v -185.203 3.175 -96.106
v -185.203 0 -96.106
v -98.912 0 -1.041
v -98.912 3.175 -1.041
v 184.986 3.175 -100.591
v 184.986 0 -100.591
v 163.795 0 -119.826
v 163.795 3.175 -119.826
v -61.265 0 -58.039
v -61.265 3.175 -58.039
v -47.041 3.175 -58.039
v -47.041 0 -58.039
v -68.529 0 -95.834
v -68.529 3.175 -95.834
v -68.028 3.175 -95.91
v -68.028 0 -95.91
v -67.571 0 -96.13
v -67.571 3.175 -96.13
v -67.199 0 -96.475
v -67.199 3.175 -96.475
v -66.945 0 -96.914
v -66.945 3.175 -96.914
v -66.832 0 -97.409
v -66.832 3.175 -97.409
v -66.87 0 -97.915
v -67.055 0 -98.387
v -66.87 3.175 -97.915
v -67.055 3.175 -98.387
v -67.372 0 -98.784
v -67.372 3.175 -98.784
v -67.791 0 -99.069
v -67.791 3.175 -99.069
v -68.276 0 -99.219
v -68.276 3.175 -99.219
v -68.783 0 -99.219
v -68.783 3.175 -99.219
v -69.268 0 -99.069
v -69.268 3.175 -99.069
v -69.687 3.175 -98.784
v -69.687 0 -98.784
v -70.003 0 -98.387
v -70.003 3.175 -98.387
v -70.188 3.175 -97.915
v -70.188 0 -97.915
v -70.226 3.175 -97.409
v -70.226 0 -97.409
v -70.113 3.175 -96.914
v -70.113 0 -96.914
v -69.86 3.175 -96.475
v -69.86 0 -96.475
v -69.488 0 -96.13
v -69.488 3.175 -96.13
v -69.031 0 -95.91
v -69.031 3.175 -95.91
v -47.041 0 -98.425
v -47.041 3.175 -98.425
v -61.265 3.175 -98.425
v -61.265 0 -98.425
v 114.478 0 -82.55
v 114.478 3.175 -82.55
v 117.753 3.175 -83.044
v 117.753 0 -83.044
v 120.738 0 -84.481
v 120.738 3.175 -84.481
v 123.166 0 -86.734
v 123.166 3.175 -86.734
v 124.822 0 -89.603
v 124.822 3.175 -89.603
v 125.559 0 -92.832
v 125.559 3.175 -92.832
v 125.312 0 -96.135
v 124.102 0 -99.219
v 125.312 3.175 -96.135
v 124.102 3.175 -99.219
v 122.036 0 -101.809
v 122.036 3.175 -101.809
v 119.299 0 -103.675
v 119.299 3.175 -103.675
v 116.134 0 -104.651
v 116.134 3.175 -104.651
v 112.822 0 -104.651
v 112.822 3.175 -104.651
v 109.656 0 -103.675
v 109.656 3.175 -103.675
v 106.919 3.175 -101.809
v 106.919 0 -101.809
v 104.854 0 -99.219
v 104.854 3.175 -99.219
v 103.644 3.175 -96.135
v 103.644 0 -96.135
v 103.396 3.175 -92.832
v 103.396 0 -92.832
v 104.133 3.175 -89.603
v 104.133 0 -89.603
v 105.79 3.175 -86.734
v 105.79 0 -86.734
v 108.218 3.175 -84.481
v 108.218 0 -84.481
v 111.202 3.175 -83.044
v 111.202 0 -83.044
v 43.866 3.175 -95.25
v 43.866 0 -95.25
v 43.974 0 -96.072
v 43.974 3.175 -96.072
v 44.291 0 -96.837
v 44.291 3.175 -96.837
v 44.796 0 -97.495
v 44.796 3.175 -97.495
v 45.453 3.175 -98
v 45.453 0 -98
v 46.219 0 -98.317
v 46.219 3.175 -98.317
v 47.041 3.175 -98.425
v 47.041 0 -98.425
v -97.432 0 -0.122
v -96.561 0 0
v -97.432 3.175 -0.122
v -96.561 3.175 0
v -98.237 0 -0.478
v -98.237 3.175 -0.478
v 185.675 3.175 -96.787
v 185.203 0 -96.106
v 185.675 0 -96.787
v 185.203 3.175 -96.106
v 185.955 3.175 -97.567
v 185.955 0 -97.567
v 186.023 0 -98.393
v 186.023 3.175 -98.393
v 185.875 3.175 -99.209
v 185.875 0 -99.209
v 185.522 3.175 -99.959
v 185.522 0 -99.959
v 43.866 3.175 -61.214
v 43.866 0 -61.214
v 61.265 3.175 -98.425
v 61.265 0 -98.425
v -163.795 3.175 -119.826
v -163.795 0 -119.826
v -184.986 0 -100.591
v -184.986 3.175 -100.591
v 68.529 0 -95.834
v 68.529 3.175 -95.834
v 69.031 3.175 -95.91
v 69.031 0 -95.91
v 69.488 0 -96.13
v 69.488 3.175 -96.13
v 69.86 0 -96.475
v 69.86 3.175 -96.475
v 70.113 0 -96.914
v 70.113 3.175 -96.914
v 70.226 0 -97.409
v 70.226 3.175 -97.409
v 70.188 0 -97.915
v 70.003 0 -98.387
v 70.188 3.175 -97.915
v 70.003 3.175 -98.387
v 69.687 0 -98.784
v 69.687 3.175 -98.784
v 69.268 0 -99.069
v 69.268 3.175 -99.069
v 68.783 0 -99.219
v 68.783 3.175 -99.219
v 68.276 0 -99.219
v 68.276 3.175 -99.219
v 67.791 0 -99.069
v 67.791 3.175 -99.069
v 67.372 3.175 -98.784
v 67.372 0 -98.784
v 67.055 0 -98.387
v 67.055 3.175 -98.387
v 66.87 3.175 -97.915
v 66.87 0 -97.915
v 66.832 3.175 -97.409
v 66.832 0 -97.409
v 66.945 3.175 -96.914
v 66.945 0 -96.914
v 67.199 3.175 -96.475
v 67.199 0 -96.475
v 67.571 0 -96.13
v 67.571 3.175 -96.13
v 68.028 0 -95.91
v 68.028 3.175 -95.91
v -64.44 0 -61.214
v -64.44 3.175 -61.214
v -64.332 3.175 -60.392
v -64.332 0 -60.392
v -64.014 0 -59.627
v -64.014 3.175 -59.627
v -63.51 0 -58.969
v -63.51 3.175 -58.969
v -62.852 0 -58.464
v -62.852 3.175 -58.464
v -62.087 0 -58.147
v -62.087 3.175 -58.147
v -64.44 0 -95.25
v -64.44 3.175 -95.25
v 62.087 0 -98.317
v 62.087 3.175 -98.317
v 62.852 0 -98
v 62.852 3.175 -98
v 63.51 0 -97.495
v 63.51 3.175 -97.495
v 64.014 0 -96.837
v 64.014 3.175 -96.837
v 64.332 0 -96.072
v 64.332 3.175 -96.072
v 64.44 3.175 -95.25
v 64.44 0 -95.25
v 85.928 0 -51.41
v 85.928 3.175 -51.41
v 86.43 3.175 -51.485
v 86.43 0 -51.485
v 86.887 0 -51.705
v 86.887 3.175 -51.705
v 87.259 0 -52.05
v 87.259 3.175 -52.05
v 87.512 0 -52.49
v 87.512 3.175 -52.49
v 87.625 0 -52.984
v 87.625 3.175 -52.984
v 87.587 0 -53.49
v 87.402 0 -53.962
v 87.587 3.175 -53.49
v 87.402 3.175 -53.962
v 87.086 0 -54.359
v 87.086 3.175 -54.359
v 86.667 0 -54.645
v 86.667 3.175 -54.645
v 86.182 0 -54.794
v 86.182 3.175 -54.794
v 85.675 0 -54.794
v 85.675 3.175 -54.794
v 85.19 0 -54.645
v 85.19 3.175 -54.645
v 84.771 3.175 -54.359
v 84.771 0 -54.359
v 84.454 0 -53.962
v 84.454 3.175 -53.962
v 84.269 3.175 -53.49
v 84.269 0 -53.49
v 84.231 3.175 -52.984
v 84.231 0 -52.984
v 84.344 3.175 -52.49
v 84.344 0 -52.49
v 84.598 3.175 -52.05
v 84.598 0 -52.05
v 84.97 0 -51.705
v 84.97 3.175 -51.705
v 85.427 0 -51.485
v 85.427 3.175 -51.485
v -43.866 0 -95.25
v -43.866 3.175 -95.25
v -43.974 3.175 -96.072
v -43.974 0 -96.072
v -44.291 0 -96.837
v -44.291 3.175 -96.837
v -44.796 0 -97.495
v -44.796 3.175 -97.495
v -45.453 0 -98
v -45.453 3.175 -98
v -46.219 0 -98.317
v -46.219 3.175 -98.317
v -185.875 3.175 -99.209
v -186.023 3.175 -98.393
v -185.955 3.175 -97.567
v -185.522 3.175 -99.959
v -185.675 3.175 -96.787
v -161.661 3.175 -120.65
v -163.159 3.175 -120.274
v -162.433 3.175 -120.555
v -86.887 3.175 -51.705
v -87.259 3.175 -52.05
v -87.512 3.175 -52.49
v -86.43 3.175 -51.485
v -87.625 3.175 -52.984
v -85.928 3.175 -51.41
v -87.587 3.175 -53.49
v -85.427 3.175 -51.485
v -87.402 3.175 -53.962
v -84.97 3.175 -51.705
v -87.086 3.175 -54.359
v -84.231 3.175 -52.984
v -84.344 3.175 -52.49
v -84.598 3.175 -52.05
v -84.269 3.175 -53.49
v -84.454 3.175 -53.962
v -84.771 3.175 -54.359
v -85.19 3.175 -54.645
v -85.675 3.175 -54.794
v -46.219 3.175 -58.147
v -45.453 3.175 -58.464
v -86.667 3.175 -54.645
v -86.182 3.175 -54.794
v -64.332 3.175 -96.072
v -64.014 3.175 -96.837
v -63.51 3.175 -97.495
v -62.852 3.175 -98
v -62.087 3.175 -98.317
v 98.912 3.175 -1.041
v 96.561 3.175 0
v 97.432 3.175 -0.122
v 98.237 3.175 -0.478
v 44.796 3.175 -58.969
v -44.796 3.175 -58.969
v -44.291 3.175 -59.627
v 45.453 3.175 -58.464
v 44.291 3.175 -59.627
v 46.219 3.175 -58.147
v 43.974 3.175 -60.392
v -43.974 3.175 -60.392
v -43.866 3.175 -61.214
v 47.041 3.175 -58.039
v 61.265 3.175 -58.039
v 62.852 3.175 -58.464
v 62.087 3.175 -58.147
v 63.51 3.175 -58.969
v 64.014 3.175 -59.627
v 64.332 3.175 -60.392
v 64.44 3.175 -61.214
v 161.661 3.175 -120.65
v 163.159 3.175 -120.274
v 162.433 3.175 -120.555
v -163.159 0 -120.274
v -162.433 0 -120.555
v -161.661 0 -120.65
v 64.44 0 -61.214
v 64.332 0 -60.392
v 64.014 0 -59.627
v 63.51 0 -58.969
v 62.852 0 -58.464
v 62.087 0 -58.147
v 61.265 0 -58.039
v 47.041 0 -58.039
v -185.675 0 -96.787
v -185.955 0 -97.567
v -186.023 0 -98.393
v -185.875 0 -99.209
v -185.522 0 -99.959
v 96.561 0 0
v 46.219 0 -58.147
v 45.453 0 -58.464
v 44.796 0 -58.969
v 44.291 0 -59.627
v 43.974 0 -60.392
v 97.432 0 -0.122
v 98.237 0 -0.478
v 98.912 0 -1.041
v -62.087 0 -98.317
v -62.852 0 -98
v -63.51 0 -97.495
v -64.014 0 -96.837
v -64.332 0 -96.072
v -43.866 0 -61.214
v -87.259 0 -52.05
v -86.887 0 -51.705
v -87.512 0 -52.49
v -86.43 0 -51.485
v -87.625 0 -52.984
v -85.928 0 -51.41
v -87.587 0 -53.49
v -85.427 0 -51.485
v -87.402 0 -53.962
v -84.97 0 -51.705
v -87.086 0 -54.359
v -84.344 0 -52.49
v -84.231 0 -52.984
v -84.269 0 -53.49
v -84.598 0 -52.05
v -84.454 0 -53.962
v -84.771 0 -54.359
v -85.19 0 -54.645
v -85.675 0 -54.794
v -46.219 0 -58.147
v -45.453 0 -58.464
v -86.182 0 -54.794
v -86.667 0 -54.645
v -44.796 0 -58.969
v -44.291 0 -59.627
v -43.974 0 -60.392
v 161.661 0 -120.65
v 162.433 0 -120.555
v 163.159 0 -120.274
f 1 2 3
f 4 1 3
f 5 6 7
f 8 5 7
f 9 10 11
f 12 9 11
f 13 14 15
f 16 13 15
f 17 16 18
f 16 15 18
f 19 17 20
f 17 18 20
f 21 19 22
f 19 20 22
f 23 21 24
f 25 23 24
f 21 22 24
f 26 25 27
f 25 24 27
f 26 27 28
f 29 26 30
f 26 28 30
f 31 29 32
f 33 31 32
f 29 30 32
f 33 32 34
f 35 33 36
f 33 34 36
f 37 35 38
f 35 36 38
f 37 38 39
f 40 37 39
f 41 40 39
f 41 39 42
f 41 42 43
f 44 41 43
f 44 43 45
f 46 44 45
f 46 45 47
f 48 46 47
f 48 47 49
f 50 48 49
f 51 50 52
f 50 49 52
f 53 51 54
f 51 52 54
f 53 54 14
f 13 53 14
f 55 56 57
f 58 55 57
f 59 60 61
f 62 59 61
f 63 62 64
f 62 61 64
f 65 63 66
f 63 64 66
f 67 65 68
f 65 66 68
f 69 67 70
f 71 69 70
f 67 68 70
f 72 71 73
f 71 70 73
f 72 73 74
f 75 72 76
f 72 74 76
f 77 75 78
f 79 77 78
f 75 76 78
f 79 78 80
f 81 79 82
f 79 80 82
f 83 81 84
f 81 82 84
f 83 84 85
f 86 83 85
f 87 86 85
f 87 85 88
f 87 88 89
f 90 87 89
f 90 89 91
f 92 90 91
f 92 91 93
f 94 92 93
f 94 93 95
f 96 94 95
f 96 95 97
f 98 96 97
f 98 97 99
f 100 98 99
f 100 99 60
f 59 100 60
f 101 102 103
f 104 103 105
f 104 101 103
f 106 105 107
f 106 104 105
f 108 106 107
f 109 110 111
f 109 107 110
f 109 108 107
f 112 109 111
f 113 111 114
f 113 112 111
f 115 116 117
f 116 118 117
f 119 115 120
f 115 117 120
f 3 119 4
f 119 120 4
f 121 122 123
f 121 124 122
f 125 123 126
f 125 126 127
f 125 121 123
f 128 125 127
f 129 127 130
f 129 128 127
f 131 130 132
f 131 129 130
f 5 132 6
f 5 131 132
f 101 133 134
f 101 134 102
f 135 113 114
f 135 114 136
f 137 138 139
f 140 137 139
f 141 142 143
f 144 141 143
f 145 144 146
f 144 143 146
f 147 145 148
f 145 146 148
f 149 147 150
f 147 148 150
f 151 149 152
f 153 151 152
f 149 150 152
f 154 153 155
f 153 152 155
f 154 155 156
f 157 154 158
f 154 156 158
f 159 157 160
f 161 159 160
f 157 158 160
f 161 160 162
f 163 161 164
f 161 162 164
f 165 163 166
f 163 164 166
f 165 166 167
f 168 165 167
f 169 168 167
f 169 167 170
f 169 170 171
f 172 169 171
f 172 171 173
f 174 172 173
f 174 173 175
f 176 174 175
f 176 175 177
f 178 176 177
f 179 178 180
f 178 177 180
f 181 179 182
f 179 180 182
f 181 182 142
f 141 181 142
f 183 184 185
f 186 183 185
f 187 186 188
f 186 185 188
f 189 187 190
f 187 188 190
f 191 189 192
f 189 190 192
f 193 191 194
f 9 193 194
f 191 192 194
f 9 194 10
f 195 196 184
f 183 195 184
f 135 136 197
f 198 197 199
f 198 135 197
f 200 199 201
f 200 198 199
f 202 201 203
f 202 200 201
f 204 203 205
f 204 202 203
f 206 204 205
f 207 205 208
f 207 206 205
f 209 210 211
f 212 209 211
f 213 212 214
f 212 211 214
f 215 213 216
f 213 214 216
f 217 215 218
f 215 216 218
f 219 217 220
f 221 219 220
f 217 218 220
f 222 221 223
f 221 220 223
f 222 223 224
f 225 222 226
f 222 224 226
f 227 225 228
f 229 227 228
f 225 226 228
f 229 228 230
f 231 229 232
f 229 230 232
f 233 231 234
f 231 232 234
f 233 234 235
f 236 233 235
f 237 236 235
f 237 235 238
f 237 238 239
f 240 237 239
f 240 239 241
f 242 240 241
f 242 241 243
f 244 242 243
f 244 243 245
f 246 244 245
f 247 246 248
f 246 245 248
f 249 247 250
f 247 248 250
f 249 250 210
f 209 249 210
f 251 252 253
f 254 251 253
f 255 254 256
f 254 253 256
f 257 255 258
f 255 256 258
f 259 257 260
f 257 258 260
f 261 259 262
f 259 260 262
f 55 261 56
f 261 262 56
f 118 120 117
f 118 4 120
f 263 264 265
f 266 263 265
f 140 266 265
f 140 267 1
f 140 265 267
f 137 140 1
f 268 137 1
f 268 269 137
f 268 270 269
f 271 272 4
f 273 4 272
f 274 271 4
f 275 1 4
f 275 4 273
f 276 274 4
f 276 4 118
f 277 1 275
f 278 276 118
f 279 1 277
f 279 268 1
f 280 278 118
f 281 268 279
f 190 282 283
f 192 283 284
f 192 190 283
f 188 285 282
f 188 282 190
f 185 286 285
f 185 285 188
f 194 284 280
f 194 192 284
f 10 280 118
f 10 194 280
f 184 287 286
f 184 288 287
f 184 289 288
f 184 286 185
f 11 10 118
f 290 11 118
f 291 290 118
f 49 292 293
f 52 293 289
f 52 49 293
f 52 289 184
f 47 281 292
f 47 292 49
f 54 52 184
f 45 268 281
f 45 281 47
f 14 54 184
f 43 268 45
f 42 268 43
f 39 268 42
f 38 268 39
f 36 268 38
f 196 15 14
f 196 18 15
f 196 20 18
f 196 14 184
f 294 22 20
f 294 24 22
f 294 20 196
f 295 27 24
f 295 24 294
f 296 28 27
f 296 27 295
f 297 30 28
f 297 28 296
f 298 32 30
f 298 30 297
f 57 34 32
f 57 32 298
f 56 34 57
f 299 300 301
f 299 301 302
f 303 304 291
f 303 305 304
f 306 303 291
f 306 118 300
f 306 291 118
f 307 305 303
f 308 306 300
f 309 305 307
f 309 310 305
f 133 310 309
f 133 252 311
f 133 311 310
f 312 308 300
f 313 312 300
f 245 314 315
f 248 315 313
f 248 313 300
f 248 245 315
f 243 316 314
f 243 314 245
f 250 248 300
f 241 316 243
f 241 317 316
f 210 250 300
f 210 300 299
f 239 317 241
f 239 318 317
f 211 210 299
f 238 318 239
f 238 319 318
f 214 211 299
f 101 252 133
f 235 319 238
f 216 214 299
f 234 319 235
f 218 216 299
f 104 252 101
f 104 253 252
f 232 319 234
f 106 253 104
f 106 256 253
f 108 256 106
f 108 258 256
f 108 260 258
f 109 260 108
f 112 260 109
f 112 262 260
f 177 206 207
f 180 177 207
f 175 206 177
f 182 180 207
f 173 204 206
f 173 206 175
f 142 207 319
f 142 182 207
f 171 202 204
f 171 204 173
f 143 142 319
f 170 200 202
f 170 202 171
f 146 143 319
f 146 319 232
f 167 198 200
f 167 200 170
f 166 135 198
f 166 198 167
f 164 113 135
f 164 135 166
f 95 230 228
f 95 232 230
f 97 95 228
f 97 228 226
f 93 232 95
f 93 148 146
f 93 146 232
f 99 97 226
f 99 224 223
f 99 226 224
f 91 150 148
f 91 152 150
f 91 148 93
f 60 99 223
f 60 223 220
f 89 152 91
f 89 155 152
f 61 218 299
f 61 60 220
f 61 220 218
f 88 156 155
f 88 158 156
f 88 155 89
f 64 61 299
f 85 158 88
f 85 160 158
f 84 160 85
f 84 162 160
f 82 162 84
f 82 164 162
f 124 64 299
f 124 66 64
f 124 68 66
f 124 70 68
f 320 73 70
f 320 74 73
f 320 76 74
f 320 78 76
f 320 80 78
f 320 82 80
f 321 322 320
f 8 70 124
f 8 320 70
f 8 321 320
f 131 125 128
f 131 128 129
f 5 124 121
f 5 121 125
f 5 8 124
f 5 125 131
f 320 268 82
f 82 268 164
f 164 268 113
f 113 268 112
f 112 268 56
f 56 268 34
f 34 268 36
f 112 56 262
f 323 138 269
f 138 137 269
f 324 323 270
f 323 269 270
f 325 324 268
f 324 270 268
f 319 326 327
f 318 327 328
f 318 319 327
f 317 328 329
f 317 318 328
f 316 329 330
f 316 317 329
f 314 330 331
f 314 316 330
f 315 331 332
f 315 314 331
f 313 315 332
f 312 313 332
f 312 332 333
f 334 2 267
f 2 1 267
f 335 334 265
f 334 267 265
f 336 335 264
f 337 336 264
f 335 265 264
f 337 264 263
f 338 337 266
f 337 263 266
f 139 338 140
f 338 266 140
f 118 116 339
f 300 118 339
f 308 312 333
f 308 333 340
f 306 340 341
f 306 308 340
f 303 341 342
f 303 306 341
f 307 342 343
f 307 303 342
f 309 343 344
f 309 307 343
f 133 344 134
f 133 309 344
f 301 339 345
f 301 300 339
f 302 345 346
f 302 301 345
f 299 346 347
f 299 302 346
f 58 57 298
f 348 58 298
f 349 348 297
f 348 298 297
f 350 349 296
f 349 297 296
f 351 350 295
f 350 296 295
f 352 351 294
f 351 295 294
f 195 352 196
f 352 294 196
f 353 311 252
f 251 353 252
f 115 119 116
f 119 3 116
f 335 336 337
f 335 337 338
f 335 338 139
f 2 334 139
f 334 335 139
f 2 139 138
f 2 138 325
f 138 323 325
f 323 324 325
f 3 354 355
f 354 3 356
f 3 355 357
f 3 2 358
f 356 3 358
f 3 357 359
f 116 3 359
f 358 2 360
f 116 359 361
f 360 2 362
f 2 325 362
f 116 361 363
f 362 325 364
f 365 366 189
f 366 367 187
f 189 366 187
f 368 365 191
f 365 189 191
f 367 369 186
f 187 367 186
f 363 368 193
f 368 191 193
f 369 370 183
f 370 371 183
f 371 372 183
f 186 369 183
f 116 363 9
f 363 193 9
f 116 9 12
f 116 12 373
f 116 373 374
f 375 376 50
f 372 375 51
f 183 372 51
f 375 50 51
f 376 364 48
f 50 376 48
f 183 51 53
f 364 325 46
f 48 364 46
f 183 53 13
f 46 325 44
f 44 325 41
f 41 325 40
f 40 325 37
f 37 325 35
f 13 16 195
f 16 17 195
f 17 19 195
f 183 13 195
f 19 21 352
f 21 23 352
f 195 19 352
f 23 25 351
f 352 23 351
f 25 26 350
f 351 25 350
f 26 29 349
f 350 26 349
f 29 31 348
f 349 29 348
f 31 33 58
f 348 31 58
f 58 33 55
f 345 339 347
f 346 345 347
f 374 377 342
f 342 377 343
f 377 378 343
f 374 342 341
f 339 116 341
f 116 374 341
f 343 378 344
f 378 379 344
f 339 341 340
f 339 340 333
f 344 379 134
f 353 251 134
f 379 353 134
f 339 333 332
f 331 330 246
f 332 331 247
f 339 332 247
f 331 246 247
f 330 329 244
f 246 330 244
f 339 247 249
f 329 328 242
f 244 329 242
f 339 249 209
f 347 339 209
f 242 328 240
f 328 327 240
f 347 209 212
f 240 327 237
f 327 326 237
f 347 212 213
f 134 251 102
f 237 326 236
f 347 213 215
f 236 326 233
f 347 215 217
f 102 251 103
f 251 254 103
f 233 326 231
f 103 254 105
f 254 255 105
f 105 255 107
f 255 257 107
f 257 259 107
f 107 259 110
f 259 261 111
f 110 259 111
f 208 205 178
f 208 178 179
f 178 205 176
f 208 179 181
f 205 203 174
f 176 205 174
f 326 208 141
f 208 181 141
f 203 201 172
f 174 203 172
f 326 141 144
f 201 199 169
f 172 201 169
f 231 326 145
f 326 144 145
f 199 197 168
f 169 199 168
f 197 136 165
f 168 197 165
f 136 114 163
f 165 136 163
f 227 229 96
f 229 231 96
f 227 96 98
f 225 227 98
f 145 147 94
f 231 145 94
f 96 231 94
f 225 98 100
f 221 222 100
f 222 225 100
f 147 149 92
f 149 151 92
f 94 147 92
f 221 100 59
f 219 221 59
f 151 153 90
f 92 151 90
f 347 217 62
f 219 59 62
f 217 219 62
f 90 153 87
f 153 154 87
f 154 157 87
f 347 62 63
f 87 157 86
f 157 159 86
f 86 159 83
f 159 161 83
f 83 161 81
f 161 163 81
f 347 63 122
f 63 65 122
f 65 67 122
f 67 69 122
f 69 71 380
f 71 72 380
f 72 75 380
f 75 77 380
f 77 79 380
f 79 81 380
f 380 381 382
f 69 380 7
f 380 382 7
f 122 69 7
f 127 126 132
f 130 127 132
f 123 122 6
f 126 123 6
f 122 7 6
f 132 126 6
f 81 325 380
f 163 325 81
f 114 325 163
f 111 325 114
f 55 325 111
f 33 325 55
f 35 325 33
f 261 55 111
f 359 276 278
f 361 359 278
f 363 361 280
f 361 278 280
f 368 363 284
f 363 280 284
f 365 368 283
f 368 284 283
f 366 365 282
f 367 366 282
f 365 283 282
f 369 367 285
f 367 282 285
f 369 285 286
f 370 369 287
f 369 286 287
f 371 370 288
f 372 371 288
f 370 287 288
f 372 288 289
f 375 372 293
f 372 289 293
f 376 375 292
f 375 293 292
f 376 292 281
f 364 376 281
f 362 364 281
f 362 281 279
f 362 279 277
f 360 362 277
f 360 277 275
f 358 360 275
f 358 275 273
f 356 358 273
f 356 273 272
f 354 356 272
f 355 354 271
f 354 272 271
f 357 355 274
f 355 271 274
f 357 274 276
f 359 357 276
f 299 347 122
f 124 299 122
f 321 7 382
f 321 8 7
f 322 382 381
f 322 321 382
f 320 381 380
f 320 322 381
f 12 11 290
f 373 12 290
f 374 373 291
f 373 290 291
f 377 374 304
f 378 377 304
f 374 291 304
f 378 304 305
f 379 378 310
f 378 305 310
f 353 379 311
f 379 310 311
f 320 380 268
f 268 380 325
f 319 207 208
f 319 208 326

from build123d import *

# Parameters (mm, degrees)
BOSS_EXTRUDE1_DEPTH = 3.175
CUT_EXTRUDE1_DEPTH  = 223.848706048
SKETCH3_R           = 1.7018
CUT_EXTRUDE2_DEPTH  = 3.175
FILLET1_R           = 3.175
SKETCH4_R           = 11.1125
CUT_EXTRUDE3_DEPTH  = 222.748694977


with BuildPart() as part:
    # Sketch1 → Boss-Extrude1 (new body)
    with BuildSketch(Plane(origin=(0, 0, 0), x_dir=(1, 0, 0), z_dir=(0, 1, 0))):
        Polygon((-97.967388467, 0), (97.967388467, 0), (187.33670933, 98.456981239), (162.886958446, 120.65), (-162.886958446, 120.65), (-187.33670933, 98.456981239), align=None)
    extrude(amount=BOSS_EXTRUDE1_DEPTH)

    # Sketch2 → Cut-Extrude1 (cut, through all)
    with BuildSketch(Plane(origin=(0, 3.175, 0), x_dir=(1, 0, 0), z_dir=(0, 1, 0))):
        with BuildLine():
            Line((-61.2648, 58.039), (-47.0408, 58.039))
            ThreePointArc((-47.0408, 58.039), (-44.79573597, 58.96893597), (-43.8658, 61.214))
            Line((-43.8658, 61.214), (-43.8658, 95.25))
            ThreePointArc((-43.8658, 95.25), (-44.79573597, 97.49506403), (-47.0408, 98.425))
            Line((-47.0408, 98.425), (-61.2648, 98.425))
            ThreePointArc((-61.2648, 98.425), (-63.50986403, 97.49506403), (-64.4398, 95.25))
            Line((-64.4398, 95.25), (-64.4398, 61.214))
            ThreePointArc((-64.4398, 61.214), (-63.50986403, 58.96893597), (-61.2648, 58.039))
        make_face()
        with BuildLine():
            Line((43.8658, 61.214), (43.8658, 95.25))
            ThreePointArc((43.8658, 95.25), (44.79573597, 97.49506403), (47.0408, 98.425))
            Line((47.0408, 98.425), (61.2648, 98.425))
            ThreePointArc((61.2648, 98.425), (63.50986403, 97.49506403), (64.4398, 95.25))
            Line((64.4398, 95.25), (64.4398, 61.214))
            ThreePointArc((64.4398, 61.214), (63.50986403, 58.96893597), (61.2648, 58.039))
            Line((61.2648, 58.039), (47.0408, 58.039))
            ThreePointArc((47.0408, 58.039), (44.79573597, 58.96893597), (43.8658, 61.214))
        make_face()
    extrude(amount=-CUT_EXTRUDE1_DEPTH, mode=Mode.SUBTRACT)

    # Sketch3 → Cut-Extrude2 (cut)
    with BuildSketch(Plane(origin=(0, 3.175, 0), x_dir=(1, 0, 0), z_dir=(0, 1, 0))):
        with Locations(Location((68.5292, 97.536, 0), (0, 0, 270))):
            Circle(SKETCH3_R)
        with Locations(Location((85.9282, 53.1114, 0), (0, 0, 270))):
            Circle(SKETCH3_R)
        with Locations(Location((-85.9282, 53.1114, 0), (0, 0, 270))):
            Circle(SKETCH3_R)
        with Locations(Location((-68.5292, 97.536, 0), (0, 0, 270))):
            Circle(SKETCH3_R)
    extrude(amount=-CUT_EXTRUDE2_DEPTH, mode=Mode.SUBTRACT)

    # Fillet1
    fillet1_edges = [part.edges().sort_by_distance(p)[0] for p in [
        (-187.33670933, 1.5875, -98.456981239),
        (-162.886958446, 1.5875, -120.65),
        (162.886958446, 1.5875, -120.65),
        (187.33670933, 1.5875, -98.456981239),
        (97.967388467, 1.5875, 0),
        (-97.967388467, 1.5875, 0),
    ]]
    fillet(fillet1_edges, radius=FILLET1_R)

    # Sketch4 → Cut-Extrude3 (cut, through all)
    with BuildSketch(Plane(origin=(0, 3.175, 0), x_dir=(1, 0, 0), z_dir=(0, 1, 0))):
        with Locations(Location((114.4778, 93.6625, 0), (0, 0, 270))):
            Circle(SKETCH4_R)
    extrude(amount=-CUT_EXTRUDE3_DEPTH, mode=Mode.SUBTRACT)


solid = part.part
